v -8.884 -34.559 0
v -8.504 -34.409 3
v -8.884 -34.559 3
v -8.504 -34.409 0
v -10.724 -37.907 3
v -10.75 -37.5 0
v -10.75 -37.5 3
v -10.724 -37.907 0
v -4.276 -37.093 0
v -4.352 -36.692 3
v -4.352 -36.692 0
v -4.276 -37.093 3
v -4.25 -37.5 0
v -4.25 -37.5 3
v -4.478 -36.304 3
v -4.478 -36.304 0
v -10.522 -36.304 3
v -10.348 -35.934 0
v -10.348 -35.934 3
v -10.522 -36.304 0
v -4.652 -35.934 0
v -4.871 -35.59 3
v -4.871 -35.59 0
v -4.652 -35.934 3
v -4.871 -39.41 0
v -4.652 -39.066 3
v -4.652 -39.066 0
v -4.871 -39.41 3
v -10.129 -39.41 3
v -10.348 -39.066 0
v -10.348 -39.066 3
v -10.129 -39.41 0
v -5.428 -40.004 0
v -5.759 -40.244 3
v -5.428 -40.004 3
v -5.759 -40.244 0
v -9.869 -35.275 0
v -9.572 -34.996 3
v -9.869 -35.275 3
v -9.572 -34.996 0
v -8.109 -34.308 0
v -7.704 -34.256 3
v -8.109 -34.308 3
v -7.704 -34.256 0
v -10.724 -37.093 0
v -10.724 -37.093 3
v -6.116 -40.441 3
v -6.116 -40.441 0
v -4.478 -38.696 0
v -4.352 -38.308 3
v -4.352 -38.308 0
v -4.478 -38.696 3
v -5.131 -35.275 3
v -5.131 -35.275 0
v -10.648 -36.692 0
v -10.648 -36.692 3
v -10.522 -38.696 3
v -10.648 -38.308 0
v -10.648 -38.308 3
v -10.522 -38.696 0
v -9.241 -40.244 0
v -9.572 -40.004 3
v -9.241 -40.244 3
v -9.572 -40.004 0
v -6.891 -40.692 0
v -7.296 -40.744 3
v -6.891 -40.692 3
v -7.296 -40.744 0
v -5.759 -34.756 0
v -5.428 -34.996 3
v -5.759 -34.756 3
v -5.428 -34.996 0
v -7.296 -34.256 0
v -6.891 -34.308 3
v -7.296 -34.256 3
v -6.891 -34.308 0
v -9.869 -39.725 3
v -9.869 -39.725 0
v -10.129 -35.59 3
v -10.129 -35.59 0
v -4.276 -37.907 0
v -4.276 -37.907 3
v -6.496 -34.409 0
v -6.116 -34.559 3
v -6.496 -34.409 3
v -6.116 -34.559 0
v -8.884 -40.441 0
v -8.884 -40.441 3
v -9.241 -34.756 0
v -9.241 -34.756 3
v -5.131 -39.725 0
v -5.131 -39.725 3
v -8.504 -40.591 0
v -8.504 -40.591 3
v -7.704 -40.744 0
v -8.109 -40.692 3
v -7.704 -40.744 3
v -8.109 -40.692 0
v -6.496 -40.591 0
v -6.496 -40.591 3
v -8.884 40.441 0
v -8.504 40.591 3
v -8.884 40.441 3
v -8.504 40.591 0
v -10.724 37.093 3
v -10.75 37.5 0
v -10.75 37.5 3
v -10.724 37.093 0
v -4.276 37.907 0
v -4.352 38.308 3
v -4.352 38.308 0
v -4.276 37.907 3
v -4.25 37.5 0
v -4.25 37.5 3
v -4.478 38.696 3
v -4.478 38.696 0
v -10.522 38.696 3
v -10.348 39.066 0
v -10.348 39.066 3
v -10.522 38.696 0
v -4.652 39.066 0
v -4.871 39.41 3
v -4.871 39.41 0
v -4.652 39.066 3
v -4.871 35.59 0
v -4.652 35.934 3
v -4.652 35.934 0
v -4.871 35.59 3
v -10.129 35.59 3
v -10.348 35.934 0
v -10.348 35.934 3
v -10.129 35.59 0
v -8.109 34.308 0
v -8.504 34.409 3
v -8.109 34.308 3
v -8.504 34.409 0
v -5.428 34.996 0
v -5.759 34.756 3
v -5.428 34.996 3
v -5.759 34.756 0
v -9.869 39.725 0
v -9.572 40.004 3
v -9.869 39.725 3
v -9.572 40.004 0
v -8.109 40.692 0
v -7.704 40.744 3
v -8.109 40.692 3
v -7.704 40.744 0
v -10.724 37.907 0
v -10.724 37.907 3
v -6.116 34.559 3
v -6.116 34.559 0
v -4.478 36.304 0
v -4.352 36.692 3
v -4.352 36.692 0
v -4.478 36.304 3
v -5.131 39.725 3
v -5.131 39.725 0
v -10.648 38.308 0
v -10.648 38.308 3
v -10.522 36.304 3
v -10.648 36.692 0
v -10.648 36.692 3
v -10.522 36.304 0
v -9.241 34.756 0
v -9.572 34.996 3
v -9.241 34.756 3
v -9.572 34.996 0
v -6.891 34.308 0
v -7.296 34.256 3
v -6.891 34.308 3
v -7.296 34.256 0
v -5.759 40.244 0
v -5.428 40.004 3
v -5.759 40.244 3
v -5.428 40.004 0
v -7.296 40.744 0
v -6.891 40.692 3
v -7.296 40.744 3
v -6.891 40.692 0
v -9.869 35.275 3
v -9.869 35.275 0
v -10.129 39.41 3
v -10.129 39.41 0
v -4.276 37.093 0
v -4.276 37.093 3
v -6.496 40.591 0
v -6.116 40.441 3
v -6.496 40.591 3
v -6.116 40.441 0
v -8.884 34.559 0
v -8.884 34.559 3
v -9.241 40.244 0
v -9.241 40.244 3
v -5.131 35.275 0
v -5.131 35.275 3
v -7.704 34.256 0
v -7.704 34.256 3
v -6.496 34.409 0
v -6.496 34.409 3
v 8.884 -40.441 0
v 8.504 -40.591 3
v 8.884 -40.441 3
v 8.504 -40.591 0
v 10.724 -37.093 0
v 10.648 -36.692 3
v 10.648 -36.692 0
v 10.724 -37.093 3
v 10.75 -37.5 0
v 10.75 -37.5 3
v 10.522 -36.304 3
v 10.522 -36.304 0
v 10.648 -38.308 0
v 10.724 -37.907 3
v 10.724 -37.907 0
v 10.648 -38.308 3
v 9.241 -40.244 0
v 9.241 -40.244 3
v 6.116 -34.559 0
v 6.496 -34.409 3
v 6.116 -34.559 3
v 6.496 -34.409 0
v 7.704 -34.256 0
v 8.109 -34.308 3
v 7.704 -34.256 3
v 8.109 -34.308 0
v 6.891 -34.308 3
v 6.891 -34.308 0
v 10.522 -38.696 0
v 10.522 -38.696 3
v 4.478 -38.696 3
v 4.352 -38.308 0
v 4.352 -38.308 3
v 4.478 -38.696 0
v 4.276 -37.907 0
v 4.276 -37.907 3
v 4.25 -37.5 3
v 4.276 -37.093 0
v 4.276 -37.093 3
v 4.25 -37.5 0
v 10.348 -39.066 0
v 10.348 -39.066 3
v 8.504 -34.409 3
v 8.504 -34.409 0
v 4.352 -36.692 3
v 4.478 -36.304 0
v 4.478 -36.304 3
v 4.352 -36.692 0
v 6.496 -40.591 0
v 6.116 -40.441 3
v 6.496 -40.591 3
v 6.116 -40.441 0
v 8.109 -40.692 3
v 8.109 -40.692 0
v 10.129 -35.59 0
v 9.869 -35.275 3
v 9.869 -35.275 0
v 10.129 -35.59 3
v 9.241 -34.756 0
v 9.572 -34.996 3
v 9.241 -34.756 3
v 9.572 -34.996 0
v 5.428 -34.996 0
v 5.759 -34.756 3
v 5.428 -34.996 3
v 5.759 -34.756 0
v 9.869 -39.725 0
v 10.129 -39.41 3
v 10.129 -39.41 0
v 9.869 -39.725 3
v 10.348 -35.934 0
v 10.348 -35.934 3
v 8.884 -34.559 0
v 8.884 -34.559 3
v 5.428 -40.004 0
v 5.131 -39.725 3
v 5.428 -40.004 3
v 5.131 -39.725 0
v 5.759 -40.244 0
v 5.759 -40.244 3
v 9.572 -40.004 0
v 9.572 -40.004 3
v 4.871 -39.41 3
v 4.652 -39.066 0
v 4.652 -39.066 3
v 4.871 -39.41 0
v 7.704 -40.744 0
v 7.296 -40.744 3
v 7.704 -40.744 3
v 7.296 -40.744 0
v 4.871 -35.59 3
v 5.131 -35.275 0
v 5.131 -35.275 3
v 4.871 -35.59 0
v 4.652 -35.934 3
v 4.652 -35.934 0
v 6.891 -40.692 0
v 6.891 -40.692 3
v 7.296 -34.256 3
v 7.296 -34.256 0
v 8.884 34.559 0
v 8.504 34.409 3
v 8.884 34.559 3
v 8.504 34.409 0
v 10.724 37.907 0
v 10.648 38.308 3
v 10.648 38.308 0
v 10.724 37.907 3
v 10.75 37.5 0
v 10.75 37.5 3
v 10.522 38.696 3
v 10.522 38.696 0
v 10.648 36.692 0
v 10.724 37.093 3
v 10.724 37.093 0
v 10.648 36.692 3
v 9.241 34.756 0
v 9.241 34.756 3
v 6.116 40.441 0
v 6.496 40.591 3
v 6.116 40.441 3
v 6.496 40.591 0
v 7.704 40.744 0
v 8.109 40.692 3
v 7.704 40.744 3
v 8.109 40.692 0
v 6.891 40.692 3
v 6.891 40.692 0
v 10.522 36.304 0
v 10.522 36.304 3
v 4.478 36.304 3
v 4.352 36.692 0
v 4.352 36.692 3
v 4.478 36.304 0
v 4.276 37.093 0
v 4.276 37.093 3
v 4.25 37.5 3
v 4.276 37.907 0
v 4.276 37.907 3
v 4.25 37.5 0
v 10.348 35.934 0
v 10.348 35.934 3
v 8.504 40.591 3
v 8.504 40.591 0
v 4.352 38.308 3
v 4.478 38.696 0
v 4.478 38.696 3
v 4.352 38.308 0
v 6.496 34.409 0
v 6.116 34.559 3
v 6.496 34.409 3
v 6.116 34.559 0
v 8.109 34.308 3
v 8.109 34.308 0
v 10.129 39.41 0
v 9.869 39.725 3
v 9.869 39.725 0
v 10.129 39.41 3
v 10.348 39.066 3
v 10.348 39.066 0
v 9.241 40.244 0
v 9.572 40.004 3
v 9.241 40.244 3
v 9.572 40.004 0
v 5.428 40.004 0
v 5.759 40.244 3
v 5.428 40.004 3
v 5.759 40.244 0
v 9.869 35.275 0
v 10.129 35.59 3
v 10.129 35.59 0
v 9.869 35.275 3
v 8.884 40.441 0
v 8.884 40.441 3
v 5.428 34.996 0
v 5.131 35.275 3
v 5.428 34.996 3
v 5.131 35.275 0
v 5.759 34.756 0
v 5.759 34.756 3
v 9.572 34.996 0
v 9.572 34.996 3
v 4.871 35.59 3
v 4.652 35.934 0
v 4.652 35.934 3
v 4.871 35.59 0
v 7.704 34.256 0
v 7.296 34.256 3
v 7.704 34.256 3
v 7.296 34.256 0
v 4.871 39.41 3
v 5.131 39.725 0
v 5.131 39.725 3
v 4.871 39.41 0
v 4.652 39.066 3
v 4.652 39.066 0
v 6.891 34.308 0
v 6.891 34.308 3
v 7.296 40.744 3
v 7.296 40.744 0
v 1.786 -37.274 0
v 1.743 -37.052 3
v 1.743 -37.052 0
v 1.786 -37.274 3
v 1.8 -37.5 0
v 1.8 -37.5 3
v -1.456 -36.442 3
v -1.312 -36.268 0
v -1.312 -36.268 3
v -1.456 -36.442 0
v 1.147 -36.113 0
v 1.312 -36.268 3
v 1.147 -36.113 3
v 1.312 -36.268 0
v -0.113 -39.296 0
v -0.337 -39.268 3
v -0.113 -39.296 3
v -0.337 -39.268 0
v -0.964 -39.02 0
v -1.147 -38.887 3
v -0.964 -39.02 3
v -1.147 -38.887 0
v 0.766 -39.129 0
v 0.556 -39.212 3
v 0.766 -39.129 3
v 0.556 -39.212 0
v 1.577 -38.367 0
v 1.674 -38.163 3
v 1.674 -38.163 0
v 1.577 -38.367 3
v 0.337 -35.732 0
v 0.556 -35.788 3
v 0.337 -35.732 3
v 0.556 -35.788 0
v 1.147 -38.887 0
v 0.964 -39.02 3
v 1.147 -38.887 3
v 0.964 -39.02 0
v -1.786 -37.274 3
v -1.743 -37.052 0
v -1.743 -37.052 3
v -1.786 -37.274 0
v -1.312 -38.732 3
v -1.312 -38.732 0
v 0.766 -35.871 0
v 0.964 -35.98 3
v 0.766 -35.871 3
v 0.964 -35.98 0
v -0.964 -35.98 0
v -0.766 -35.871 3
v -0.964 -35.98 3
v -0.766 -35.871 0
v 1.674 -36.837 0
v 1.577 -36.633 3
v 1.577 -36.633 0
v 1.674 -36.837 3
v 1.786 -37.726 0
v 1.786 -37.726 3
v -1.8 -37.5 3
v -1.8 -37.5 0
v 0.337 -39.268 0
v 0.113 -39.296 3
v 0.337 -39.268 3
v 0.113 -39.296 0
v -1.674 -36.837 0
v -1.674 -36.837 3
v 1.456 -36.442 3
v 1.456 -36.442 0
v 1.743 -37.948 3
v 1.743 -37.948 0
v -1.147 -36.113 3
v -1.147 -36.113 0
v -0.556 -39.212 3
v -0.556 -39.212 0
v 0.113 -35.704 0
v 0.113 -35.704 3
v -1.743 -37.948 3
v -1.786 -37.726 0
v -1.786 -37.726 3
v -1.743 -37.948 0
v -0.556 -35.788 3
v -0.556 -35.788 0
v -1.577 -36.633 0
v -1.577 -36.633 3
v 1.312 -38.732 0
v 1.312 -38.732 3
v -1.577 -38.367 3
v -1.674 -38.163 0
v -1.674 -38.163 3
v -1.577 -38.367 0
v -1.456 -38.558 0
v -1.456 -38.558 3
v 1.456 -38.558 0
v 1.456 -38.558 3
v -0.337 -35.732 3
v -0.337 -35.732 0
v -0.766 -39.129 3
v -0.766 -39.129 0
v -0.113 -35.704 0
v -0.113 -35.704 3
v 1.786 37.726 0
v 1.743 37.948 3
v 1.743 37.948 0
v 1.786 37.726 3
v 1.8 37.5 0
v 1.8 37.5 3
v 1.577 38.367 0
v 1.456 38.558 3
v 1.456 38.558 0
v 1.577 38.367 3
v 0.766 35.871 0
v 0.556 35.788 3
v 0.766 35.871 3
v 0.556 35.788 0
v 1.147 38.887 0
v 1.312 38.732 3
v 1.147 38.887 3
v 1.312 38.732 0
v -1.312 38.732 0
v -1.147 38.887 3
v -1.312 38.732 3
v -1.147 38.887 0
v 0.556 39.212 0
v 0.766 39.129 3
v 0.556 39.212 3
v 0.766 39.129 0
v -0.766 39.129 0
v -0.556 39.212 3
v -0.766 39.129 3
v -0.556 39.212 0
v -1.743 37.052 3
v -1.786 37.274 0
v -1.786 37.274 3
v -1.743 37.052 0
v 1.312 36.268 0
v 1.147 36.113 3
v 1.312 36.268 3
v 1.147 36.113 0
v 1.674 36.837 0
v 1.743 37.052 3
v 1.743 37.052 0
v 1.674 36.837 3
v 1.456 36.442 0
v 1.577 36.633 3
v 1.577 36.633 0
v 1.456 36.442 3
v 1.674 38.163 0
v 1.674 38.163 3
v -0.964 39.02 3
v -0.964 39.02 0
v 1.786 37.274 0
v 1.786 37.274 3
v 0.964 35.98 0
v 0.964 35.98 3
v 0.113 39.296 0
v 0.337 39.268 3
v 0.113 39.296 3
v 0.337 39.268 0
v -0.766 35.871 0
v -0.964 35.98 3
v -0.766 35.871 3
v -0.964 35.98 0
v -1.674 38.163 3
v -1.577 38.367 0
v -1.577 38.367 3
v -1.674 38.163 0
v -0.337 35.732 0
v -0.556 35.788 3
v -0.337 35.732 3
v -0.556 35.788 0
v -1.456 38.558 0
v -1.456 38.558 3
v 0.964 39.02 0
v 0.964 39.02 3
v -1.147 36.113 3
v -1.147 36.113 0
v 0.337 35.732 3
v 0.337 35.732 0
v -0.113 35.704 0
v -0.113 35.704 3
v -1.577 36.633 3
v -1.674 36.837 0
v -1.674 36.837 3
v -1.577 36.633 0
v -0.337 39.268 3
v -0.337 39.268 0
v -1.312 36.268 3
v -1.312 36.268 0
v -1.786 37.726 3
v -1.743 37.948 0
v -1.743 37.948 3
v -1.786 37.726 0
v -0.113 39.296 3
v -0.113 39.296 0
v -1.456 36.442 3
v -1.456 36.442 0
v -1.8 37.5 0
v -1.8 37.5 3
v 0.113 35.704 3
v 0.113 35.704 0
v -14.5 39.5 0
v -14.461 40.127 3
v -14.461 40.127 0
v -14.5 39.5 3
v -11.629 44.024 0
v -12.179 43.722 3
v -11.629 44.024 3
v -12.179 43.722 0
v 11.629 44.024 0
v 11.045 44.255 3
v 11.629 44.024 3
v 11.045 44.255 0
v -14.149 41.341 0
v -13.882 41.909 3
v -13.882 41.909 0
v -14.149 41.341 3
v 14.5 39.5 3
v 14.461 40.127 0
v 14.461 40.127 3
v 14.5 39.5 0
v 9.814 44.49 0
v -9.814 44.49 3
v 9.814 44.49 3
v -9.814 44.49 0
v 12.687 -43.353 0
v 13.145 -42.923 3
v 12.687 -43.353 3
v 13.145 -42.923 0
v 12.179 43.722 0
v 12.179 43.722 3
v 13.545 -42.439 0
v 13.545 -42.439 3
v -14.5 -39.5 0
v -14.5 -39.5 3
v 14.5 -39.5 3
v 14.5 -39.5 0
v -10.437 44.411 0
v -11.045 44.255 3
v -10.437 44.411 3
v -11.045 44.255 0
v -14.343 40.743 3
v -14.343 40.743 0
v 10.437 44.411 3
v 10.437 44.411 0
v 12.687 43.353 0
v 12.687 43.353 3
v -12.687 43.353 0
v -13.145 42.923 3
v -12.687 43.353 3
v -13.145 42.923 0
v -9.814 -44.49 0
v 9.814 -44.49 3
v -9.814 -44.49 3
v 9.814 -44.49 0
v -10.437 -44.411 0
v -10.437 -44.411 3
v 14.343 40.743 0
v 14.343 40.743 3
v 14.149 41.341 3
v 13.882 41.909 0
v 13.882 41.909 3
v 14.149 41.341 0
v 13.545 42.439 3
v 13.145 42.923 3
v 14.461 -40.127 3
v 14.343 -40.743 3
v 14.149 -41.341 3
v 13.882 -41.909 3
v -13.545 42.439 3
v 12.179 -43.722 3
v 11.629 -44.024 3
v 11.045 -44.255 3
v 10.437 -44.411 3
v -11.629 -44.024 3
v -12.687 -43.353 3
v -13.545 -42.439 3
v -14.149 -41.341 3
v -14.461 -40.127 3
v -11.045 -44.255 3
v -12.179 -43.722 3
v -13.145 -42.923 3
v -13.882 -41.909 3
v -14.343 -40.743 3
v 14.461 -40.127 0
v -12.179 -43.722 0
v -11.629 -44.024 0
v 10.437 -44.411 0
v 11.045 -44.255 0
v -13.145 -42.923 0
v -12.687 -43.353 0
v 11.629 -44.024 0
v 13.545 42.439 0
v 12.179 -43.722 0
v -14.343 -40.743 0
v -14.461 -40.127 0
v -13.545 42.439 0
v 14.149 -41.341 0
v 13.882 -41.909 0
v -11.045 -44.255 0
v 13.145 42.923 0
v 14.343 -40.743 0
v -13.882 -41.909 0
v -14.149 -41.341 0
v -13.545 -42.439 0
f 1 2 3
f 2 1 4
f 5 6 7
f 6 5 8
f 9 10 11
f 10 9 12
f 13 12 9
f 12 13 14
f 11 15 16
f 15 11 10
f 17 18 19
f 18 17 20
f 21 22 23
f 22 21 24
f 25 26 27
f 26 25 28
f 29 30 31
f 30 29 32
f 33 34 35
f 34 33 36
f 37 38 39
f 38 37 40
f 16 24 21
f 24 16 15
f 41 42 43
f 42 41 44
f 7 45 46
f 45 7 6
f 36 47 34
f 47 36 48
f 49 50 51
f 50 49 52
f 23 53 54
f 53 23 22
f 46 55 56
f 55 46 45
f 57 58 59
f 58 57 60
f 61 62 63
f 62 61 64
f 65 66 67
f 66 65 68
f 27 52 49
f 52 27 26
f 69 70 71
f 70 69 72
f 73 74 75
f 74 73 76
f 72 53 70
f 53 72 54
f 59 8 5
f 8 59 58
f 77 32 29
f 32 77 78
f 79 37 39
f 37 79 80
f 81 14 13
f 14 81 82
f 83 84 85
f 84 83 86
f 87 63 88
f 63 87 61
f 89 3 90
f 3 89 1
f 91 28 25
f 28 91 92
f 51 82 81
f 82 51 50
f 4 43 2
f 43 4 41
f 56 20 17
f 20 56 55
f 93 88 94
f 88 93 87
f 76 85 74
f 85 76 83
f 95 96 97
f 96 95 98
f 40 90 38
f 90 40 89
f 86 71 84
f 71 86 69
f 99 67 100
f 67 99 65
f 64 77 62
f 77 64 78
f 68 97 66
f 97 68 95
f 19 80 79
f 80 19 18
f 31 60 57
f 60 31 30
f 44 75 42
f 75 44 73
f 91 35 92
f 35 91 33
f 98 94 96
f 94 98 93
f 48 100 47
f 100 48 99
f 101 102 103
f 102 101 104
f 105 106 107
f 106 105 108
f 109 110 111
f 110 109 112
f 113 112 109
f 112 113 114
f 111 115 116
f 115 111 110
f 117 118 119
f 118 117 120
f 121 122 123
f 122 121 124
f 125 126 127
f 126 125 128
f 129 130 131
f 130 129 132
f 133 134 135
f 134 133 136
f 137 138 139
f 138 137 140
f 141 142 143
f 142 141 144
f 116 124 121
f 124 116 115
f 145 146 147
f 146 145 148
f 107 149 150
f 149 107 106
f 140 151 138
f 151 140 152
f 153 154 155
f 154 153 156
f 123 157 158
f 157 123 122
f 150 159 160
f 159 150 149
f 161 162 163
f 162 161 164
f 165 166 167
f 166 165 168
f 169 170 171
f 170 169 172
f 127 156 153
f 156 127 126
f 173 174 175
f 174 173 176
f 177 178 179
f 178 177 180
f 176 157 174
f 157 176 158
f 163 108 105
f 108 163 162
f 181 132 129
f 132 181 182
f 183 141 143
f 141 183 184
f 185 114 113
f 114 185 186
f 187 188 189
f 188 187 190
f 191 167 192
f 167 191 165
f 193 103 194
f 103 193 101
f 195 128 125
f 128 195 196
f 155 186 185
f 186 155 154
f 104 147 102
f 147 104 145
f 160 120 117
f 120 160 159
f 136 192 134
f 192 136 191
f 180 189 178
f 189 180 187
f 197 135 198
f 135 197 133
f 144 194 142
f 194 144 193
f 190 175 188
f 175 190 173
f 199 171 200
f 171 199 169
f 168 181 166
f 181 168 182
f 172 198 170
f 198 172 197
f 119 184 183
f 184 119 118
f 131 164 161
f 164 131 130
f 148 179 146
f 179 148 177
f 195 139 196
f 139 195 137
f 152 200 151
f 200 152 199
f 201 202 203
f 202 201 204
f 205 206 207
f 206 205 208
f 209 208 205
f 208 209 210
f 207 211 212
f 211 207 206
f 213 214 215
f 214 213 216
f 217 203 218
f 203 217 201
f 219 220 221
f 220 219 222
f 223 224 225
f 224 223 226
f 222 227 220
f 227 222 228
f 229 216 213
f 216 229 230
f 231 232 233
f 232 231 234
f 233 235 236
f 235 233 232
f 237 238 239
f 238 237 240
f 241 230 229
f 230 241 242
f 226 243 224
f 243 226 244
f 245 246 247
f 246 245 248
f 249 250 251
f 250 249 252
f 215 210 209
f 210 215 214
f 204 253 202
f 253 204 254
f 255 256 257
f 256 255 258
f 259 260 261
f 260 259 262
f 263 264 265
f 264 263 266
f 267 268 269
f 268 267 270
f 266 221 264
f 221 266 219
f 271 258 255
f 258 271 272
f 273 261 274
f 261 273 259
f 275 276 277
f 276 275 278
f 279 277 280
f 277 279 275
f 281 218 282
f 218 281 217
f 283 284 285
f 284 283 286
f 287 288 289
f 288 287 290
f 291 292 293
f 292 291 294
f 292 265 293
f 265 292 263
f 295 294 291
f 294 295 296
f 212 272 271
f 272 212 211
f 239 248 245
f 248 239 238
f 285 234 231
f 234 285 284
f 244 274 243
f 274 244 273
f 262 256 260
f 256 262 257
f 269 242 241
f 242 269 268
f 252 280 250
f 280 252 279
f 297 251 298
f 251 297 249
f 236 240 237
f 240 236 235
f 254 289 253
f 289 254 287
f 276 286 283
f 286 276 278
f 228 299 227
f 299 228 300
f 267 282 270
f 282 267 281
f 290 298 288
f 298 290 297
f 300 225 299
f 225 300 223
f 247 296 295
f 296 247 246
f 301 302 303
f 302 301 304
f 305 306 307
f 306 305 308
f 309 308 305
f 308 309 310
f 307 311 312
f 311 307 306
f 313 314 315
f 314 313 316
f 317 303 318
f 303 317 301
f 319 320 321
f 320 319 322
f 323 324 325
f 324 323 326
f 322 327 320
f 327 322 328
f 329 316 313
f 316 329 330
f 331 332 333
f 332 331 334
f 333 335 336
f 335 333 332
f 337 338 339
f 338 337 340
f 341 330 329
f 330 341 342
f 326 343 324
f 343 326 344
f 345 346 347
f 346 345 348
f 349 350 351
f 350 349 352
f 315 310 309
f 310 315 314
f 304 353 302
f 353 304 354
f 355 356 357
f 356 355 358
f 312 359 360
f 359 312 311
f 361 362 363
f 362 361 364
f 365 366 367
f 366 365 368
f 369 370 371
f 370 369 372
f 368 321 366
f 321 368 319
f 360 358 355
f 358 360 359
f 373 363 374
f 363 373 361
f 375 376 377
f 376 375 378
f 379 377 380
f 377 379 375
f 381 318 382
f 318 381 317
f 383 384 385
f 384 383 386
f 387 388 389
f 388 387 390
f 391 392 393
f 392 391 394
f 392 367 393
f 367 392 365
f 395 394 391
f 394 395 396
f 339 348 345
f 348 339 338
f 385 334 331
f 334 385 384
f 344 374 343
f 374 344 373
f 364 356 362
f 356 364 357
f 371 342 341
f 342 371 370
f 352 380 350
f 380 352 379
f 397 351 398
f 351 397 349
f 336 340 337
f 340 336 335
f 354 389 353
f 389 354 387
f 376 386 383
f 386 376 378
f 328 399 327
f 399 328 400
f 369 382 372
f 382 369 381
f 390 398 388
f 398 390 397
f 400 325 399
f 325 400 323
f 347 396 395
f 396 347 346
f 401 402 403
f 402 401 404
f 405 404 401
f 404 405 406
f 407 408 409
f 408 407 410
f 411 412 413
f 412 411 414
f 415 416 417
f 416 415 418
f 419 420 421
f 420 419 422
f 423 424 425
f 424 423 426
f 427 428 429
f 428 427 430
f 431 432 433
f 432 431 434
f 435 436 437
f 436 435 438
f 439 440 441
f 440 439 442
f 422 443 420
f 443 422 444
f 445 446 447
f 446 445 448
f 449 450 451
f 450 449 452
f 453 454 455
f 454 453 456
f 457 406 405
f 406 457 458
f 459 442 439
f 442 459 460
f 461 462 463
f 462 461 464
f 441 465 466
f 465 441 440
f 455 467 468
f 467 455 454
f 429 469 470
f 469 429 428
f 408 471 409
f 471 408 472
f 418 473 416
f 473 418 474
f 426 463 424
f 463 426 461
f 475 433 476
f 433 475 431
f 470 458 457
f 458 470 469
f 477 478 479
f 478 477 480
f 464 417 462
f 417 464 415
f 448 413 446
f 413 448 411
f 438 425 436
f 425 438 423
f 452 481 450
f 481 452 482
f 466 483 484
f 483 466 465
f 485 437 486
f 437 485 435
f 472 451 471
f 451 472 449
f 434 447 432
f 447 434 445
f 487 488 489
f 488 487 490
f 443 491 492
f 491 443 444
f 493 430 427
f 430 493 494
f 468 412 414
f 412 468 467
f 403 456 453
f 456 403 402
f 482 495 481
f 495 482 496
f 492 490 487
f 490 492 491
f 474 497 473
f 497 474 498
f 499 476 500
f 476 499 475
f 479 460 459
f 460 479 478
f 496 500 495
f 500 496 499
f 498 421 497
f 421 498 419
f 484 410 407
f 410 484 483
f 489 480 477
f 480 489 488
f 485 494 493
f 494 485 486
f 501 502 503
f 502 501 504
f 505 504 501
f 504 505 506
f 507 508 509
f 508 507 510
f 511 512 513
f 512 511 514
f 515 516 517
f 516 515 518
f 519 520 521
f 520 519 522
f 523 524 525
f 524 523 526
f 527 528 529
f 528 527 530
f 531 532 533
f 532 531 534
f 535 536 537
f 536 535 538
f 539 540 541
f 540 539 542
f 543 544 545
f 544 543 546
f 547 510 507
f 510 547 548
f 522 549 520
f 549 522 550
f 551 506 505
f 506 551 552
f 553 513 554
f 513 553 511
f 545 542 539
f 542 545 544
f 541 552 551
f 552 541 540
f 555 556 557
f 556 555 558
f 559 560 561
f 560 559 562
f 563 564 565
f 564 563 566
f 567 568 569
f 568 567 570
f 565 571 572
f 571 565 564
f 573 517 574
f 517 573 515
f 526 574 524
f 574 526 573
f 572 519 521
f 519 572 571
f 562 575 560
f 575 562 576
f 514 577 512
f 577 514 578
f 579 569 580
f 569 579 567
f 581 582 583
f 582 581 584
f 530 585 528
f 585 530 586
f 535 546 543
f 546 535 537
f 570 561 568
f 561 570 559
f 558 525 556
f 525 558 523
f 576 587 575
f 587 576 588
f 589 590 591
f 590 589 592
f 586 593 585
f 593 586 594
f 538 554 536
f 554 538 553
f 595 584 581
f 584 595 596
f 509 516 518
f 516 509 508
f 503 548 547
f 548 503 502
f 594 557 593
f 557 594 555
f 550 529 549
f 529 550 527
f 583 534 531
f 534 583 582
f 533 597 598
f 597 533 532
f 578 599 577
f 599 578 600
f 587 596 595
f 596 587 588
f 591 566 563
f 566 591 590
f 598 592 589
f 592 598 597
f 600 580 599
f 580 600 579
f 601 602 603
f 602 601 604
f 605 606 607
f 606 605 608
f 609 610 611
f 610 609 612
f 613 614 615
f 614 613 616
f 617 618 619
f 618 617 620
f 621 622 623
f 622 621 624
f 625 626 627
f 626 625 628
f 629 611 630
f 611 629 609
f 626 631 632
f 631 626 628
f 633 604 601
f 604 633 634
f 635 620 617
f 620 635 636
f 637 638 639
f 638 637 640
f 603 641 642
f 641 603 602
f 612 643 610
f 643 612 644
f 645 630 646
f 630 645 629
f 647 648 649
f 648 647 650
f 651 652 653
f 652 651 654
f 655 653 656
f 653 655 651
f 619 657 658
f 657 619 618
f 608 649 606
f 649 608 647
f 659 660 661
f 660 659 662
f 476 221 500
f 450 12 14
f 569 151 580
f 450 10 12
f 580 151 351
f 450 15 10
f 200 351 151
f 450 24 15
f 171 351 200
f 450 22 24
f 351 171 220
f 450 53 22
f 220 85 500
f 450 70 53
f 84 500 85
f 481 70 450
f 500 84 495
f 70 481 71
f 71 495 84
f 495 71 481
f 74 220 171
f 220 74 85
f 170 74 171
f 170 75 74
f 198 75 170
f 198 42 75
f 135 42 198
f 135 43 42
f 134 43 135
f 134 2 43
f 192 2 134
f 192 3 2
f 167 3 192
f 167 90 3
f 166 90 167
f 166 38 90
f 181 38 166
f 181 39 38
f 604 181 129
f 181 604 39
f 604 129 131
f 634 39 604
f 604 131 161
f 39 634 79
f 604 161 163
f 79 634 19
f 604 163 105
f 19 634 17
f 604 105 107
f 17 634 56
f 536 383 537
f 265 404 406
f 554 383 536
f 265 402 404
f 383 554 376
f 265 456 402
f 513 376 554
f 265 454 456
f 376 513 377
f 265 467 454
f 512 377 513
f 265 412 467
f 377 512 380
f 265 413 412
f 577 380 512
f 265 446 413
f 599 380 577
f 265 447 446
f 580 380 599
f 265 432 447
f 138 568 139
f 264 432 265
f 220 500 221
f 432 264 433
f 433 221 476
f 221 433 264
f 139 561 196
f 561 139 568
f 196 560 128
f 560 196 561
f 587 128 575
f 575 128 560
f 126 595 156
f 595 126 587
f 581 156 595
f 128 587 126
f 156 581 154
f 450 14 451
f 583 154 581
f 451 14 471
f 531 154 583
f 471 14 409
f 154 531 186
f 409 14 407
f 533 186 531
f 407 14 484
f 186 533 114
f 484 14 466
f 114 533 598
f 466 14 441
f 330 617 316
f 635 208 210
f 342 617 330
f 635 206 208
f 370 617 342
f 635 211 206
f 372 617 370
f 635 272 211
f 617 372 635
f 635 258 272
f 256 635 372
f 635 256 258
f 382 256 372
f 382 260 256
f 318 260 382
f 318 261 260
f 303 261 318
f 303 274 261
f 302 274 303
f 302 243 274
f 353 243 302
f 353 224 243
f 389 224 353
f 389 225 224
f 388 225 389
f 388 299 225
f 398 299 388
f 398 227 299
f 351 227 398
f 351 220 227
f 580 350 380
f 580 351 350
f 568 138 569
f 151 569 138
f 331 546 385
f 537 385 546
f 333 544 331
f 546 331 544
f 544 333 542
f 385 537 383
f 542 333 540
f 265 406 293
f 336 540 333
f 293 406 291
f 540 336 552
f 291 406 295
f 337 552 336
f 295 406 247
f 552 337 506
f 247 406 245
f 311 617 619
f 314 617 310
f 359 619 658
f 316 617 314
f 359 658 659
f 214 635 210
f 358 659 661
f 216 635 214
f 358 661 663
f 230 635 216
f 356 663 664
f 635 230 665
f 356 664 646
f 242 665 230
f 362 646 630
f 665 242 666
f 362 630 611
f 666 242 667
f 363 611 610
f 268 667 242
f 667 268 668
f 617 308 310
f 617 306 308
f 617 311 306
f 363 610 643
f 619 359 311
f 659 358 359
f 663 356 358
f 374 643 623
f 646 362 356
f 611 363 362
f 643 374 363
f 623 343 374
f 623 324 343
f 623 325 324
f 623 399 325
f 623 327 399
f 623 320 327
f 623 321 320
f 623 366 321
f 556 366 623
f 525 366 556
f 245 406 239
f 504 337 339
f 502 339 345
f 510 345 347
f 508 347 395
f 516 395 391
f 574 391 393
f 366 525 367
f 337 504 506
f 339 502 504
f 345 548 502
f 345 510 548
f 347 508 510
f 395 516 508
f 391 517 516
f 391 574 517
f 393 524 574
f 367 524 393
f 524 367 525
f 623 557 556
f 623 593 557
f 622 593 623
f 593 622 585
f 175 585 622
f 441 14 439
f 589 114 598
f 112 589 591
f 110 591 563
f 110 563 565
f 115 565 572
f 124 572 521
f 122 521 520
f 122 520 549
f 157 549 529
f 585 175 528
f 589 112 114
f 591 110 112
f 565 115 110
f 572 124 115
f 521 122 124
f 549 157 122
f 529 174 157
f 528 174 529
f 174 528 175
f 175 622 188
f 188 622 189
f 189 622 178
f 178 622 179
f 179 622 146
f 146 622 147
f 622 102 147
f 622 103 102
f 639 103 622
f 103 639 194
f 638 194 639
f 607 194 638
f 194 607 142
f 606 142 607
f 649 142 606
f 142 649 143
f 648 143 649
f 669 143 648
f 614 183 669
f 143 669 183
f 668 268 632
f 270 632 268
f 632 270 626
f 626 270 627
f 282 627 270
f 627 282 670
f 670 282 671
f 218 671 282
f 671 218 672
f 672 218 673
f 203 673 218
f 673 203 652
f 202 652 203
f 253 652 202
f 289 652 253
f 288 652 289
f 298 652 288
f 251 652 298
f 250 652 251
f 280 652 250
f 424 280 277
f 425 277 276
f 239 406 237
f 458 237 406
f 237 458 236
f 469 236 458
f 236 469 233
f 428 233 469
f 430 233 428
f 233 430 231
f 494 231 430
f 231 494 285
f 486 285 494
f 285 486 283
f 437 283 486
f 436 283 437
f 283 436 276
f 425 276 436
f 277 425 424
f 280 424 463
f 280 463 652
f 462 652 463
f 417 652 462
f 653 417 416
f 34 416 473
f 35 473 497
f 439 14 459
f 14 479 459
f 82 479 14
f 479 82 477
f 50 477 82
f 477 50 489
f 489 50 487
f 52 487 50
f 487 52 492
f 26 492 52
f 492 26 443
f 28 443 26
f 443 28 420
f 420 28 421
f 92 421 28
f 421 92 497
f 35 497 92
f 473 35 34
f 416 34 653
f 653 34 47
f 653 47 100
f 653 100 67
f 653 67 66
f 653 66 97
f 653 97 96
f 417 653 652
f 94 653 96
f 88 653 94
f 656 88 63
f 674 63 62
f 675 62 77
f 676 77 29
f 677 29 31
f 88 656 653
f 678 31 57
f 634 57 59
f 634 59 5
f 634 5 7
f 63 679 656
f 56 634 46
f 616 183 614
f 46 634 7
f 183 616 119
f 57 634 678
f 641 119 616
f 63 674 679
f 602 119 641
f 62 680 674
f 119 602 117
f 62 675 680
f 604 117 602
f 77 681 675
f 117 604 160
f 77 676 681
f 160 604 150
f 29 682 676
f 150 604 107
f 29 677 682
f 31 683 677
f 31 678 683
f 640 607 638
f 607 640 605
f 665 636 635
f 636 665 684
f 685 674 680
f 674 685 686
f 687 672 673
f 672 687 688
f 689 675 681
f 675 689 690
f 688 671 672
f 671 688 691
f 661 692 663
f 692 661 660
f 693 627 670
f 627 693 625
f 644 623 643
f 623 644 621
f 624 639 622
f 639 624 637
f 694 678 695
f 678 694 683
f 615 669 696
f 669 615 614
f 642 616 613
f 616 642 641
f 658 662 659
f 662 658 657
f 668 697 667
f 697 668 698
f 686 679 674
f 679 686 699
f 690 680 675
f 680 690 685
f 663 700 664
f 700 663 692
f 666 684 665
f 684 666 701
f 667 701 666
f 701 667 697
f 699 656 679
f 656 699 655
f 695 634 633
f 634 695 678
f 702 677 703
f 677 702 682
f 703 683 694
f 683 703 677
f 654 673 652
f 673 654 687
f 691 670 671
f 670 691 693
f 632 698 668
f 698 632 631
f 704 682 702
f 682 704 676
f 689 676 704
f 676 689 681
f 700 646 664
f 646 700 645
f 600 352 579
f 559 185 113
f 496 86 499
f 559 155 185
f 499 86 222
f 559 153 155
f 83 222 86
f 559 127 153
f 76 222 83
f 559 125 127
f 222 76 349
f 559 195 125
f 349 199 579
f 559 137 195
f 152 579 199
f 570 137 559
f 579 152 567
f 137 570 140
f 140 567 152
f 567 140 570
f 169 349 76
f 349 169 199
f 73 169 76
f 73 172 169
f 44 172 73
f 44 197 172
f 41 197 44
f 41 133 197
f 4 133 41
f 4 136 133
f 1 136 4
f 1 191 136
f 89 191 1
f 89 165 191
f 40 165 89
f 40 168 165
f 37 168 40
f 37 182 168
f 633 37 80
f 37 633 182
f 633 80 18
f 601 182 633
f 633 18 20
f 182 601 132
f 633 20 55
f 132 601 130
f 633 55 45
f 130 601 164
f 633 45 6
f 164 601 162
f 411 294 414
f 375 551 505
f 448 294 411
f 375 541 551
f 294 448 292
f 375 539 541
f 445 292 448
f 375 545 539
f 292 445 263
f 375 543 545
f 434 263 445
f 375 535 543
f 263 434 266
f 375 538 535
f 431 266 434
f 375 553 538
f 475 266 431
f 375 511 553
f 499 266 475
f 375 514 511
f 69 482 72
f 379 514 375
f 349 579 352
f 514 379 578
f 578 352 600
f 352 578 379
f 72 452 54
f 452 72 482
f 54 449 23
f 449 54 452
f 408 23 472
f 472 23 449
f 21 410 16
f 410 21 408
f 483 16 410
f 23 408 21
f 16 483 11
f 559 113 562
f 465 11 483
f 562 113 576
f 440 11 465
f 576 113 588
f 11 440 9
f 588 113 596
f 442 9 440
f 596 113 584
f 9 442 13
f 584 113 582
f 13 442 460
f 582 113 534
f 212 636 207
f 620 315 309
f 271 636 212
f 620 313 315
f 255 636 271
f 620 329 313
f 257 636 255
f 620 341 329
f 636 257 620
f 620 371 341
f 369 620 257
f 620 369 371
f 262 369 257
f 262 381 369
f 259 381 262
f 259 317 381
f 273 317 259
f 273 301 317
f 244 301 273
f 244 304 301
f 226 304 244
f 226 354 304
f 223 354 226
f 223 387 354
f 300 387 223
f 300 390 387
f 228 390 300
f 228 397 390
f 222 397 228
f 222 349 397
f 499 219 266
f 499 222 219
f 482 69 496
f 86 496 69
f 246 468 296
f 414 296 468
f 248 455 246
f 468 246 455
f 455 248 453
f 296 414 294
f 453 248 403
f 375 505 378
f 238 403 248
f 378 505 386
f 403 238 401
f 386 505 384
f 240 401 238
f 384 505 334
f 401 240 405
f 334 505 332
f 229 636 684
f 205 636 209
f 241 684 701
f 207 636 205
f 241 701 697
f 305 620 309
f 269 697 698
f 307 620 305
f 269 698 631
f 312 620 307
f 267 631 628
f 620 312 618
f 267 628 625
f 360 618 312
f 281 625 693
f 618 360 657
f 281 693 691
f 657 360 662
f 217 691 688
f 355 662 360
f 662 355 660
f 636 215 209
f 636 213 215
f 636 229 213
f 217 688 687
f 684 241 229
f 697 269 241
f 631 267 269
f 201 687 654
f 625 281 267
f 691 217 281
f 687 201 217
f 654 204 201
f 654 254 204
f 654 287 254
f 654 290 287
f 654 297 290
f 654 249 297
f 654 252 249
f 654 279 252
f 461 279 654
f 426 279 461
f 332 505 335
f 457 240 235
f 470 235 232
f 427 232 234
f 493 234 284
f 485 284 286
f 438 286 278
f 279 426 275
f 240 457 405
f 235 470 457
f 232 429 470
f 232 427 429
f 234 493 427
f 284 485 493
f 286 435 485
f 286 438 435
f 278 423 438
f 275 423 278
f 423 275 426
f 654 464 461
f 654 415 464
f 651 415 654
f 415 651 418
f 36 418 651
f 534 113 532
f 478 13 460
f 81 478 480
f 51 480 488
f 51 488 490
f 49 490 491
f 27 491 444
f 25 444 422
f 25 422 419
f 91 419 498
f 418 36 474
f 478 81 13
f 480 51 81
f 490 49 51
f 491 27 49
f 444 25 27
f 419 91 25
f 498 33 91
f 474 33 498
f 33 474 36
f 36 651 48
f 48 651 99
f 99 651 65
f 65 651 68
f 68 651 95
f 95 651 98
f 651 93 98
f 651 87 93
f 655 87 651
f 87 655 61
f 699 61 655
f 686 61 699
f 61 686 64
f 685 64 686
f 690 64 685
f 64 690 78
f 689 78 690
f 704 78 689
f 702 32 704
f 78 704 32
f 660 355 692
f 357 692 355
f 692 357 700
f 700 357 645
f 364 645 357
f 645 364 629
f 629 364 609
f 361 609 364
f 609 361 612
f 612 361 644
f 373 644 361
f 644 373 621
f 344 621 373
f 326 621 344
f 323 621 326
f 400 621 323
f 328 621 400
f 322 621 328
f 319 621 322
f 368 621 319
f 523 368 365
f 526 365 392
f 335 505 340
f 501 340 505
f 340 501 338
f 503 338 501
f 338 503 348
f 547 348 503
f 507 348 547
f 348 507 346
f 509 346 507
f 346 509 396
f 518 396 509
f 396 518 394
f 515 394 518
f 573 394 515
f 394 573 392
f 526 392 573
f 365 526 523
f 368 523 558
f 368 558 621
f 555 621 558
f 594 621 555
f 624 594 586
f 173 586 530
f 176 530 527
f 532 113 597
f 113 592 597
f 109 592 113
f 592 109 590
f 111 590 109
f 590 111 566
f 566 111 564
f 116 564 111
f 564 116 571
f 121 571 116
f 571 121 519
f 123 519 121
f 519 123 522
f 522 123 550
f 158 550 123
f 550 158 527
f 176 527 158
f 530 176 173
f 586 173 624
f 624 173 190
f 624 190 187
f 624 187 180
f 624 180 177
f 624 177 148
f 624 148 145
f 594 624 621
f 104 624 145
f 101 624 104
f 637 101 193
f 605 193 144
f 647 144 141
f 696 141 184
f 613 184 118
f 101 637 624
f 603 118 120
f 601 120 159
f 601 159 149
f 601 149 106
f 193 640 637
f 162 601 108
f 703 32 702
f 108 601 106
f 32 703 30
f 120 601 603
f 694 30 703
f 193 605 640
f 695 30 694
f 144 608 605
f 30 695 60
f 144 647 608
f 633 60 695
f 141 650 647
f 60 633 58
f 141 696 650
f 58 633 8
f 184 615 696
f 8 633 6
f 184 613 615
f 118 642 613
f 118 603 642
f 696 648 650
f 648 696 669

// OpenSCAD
$fn = 50;

difference() {
	union() {
		hull() {
			translate(v = [-9.5, 39.5, 0]) {
				cylinder(h = 3, r = 5);
			}
			translate(v = [9.5, 39.5, 0]) {
				cylinder(h = 3, r = 5);
			}
			translate(v = [-9.5, -39.5, 0]) {
				cylinder(h = 3, r = 5);
			}
			translate(v = [9.5, -39.5, 0]) {
				cylinder(h = 3, r = 5);
			}
		}
	}
	union() {
		translate(v = [-7.5, -37.5, -1]) {
			cylinder(h = 5, r = 3.25);
		}
		translate(v = [-7.5, 37.5, -1]) {
			cylinder(h = 5, r = 3.25);
		}
		translate(v = [7.5, -37.5, -1]) {
			cylinder(h = 5, r = 3.25);
		}
		translate(v = [7.5, 37.5, -1]) {
			cylinder(h = 5, r = 3.25);
		}
		translate(v = [0.0, -37.5, -1]) {
			cylinder(h = 5, r = 1.8);
		}
		translate(v = [0.0, 37.5, -1]) {
			cylinder(h = 5, r = 1.8);
		}
	}
}
